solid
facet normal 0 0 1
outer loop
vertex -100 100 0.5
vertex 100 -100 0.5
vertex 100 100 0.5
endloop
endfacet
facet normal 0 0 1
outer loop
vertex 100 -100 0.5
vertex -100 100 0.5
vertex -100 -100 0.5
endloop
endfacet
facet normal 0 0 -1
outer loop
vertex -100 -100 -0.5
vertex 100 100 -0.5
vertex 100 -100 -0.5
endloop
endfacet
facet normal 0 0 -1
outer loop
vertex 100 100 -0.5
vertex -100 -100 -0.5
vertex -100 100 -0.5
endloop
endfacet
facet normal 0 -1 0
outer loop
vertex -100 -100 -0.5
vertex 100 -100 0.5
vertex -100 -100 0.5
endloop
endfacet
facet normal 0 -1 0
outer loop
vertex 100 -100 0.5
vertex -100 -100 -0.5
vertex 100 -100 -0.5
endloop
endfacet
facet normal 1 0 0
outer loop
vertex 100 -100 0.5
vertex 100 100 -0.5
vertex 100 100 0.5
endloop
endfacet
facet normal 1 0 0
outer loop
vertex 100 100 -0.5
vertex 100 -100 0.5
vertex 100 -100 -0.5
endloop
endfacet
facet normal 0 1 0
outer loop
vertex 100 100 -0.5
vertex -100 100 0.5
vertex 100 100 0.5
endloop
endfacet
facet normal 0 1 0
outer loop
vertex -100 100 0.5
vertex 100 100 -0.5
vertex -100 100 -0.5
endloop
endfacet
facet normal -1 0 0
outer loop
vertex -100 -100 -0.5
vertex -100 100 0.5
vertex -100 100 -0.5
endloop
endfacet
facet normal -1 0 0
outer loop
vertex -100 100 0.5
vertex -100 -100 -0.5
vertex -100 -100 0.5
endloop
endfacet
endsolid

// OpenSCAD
$fn=64;

module sheet(size=[200,200,1]) {
    cube(size, center=true);
}

sheet();
